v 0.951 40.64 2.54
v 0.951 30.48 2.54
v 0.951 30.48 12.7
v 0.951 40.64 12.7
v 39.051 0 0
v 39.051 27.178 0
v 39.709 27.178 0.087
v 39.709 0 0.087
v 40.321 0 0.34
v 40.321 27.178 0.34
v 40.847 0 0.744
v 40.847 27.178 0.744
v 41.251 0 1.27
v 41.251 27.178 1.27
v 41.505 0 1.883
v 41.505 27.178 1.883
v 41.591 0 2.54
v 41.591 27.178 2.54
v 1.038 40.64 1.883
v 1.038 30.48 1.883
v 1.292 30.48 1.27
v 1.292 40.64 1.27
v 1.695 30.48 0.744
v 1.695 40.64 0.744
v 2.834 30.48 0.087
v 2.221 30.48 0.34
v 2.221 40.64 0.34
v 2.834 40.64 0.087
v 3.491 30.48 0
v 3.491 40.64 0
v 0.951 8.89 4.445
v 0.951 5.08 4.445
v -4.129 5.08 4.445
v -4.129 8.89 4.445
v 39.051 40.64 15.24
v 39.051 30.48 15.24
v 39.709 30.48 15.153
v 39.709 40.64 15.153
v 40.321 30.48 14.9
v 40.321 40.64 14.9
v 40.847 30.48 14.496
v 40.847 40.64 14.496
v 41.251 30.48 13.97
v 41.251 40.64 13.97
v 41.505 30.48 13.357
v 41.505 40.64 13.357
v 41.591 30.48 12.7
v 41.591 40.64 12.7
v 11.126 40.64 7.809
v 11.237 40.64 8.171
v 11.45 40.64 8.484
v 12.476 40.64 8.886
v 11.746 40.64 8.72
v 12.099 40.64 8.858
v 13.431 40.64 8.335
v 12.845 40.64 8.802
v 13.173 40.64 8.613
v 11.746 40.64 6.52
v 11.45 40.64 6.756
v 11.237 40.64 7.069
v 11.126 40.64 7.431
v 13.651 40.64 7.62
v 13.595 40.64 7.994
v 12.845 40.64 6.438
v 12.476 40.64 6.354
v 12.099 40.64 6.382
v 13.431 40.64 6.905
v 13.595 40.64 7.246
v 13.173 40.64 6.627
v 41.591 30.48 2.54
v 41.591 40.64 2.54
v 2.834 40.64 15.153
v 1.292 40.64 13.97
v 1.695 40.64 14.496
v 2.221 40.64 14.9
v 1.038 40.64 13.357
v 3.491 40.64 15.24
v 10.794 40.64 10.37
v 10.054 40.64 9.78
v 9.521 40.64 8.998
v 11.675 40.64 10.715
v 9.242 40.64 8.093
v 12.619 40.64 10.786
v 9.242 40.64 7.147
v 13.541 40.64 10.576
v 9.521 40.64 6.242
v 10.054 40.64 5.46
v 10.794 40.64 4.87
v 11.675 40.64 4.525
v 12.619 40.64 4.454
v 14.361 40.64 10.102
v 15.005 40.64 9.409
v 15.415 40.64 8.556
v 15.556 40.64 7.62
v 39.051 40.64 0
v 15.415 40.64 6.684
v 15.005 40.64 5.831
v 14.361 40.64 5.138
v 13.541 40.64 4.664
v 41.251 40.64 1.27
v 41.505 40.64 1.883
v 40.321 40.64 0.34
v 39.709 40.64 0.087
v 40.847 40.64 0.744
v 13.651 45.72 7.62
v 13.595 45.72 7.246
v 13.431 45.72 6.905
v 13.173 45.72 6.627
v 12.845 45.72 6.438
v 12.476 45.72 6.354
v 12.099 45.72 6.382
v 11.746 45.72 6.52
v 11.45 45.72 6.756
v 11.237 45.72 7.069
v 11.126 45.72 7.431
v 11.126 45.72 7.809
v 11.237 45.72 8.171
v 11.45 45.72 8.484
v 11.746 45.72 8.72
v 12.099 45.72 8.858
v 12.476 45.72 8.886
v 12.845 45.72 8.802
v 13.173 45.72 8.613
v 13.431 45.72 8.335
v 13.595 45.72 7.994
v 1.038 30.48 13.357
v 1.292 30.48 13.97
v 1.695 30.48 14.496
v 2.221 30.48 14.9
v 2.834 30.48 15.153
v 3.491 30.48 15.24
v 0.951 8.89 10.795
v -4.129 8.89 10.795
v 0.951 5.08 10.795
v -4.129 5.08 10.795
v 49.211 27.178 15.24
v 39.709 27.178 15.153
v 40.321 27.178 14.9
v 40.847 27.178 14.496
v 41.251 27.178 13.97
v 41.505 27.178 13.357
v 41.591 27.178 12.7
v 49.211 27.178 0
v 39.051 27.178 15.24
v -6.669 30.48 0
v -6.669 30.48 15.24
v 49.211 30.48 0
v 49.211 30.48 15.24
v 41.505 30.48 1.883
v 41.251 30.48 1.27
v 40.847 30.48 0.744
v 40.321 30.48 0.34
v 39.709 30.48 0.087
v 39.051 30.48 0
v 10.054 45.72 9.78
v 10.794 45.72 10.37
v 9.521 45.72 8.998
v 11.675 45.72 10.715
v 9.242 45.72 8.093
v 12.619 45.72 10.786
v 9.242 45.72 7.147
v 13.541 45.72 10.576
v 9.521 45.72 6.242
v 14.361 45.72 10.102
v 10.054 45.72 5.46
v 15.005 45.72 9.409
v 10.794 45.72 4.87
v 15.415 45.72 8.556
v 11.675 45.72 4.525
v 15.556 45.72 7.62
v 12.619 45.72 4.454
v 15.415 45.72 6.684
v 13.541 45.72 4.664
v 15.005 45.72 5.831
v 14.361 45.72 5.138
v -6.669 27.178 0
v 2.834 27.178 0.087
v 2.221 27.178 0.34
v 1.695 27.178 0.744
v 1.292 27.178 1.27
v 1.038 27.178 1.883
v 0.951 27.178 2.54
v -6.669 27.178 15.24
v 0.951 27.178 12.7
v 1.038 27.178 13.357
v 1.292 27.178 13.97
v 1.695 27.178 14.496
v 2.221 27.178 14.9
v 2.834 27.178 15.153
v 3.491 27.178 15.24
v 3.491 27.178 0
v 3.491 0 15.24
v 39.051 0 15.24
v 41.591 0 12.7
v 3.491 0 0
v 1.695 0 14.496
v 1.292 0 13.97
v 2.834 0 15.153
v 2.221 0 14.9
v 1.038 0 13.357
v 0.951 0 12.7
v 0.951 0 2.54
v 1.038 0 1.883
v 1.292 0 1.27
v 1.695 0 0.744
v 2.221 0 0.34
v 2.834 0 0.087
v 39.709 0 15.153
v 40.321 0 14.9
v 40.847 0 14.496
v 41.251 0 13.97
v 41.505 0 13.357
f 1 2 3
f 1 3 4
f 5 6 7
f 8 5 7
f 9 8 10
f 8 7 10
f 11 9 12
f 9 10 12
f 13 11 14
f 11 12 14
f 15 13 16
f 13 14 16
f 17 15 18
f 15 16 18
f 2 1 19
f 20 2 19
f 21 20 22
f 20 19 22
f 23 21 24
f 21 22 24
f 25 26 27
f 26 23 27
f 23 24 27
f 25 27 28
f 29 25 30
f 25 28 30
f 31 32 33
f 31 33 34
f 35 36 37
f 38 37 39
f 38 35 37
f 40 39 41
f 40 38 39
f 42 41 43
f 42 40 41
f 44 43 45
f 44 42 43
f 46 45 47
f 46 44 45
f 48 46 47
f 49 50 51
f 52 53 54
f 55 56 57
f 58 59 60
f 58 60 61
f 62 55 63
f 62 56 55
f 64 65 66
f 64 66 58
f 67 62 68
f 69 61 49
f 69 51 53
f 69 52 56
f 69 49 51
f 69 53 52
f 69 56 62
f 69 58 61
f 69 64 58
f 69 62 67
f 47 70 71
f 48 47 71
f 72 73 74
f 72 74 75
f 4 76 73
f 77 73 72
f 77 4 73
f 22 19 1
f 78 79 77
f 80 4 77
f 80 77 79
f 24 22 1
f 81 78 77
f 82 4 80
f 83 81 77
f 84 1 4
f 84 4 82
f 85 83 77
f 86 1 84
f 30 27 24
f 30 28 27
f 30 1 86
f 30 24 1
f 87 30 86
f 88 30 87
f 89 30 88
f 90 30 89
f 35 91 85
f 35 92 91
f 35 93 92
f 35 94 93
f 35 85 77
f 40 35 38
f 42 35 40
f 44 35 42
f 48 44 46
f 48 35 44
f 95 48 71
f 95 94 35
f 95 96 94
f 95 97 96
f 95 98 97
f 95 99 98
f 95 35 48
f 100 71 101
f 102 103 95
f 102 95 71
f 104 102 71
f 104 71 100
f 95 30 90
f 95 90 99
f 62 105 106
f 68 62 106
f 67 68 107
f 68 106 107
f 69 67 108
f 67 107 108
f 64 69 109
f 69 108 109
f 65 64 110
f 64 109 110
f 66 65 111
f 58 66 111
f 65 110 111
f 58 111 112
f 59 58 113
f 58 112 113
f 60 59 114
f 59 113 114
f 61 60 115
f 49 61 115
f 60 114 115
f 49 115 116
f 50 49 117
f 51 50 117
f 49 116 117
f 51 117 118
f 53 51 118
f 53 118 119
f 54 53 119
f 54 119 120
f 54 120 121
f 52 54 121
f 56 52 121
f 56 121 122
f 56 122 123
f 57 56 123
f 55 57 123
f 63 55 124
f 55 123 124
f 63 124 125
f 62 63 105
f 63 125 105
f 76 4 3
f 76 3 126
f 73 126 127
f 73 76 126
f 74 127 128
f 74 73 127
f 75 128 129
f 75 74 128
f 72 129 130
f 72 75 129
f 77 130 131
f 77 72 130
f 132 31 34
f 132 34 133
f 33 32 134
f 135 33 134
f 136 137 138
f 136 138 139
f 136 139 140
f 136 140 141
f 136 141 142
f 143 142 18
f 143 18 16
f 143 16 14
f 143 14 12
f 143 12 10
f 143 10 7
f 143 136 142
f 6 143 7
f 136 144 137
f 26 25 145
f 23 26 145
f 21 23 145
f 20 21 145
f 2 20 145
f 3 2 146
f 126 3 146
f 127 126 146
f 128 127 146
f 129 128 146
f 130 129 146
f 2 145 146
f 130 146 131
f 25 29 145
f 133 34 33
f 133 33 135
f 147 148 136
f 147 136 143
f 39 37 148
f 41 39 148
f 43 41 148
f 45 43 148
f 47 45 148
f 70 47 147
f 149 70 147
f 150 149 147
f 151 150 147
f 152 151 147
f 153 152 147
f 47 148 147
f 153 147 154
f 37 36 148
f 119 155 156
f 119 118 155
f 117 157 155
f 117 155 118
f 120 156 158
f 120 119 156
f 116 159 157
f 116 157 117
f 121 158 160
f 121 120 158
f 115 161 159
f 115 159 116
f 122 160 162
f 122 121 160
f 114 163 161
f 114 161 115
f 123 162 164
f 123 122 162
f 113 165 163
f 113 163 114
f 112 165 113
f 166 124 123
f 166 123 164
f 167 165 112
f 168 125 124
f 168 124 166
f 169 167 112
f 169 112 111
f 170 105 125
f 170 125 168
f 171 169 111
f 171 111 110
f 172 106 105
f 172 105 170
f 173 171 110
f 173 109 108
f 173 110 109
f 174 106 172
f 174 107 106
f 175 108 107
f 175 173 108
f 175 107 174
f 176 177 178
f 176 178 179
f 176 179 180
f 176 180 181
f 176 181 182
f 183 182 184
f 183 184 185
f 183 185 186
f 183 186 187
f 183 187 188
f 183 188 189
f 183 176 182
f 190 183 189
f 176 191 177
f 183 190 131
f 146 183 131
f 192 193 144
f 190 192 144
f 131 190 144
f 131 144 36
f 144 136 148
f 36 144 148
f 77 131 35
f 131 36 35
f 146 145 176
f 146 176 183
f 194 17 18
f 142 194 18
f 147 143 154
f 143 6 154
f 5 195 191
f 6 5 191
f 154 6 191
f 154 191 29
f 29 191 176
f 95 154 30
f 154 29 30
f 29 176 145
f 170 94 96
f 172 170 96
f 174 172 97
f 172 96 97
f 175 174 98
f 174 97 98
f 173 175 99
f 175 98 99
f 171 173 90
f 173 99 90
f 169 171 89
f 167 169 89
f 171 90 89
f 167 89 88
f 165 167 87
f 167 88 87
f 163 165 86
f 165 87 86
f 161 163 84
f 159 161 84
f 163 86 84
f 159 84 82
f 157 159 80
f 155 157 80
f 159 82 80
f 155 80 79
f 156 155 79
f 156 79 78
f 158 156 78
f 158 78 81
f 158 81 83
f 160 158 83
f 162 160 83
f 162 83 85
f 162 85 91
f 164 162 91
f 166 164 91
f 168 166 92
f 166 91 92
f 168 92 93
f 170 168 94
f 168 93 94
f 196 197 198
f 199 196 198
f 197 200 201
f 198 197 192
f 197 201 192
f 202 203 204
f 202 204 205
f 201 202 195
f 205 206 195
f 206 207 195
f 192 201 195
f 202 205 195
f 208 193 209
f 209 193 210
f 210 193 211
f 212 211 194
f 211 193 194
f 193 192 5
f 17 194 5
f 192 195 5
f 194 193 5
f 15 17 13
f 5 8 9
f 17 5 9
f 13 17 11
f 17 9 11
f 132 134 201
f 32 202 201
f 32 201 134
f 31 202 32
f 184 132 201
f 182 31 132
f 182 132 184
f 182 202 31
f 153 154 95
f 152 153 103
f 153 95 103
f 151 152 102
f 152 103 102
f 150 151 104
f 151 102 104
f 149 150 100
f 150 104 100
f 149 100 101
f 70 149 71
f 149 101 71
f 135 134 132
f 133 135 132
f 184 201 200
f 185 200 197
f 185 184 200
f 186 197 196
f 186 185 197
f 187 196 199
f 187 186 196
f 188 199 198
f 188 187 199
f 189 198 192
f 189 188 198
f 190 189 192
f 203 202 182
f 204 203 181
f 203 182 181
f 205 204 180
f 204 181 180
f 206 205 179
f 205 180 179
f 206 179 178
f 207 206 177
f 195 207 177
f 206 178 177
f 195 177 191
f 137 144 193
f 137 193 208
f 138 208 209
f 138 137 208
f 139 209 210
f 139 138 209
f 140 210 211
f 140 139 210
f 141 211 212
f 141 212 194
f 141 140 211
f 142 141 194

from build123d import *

# Parameters (mm, degrees)
SKETCH1_W                = 40.64
SKETCH1_H                = 40.64
BOSS_EXTRUDE1_DEPTH      = 15.24
SKETCH2_R                = 3.175
BOSS_EXTRUDE2_DEPTH      = 5.08
SKETCH3_R                = 1.27
CUT_EXTRUDE1_DEPTH       = 5.08
FILLET2_R                = 2.54
SKETCH4_W                = 6.35
SKETCH4_H                = 3.81
BOSS_EXTRUDE3_DEPTH      = 5.08
SKETCH5_W                = 15.24
SKETCH5_H                = 3.302
BOSS_EXTRUDE4_DEPTH      = 7.62
BOSS_EXTRUDE4_DEPTH_BACK = 2.54
SKETCH6_W                = 15.24
SKETCH6_H                = 3.302
BOSS_EXTRUDE5_DEPTH      = 7.62
BOSS_EXTRUDE5_DEPTH_BACK = 2.54


with BuildPart() as part:
    # Sketch1 → Boss-Extrude1 (new body)
    with BuildSketch(Plane.XY):
        with Locations((21.271438127, 20.32)):
            Rectangle(SKETCH1_W, SKETCH1_H)
    extrude(amount=BOSS_EXTRUDE1_DEPTH)

    # Sketch2 → Boss-Extrude2 (add)
    with BuildSketch(Plane(origin=(0, 40.64, 0), x_dir=(1, 0, 0), z_dir=(0, 1, 0))):
        with Locations((12.381438127, -7.62)):
            Circle(SKETCH2_R)
    extrude(amount=BOSS_EXTRUDE2_DEPTH)

    # Sketch3 → Cut-Extrude1 (cut)
    with BuildSketch(Plane(origin=(0, 45.72, 0), x_dir=(1, 0, 0), z_dir=(0, 1, 0))):
        with Locations((12.381438127, -7.62)):
            Circle(SKETCH3_R)
    extrude(amount=-CUT_EXTRUDE1_DEPTH, mode=Mode.SUBTRACT)

    # Fillet2
    fillet2_edges = [part.edges().sort_by_distance(p)[0] for p in [
        (41.591438127, 20.32, 15.24),
        (0.951438127, 20.32, 15.24),
        (41.591438127, 20.32, 0),
        (0.951438127, 20.32, 0),
    ]]
    fillet(fillet2_edges, radius=FILLET2_R)

    # Sketch4 → Boss-Extrude3 (add)
    with BuildSketch(Plane.ZY.offset(-0.951438127)):
        with Locations((7.62, 6.985)):
            Rectangle(SKETCH4_W, SKETCH4_H)
    extrude(amount=BOSS_EXTRUDE3_DEPTH)

    # Sketch5 → Boss-Extrude4 (add, two sides)
    with BuildSketch(Plane.ZY.offset(-0.951438127)) as boss_extrude4_sk:
        with Locations((7.62, 28.829)):
            Rectangle(SKETCH5_W, SKETCH5_H)
    extrude(amount=BOSS_EXTRUDE4_DEPTH)
    extrude(boss_extrude4_sk.sketch, amount=-BOSS_EXTRUDE4_DEPTH_BACK)

    # Sketch6 → Boss-Extrude5 (add, two sides)
    with BuildSketch(Plane(origin=(41.591438127, 0, 0), x_dir=(0, 0, -1), z_dir=(1, 0, 0))) as boss_extrude5_sk:
        with Locations((-7.62, 28.829)):
            Rectangle(SKETCH6_W, SKETCH6_H)
    extrude(amount=BOSS_EXTRUDE5_DEPTH)
    extrude(boss_extrude5_sk.sketch, amount=-BOSS_EXTRUDE5_DEPTH_BACK)


solid = part.part
